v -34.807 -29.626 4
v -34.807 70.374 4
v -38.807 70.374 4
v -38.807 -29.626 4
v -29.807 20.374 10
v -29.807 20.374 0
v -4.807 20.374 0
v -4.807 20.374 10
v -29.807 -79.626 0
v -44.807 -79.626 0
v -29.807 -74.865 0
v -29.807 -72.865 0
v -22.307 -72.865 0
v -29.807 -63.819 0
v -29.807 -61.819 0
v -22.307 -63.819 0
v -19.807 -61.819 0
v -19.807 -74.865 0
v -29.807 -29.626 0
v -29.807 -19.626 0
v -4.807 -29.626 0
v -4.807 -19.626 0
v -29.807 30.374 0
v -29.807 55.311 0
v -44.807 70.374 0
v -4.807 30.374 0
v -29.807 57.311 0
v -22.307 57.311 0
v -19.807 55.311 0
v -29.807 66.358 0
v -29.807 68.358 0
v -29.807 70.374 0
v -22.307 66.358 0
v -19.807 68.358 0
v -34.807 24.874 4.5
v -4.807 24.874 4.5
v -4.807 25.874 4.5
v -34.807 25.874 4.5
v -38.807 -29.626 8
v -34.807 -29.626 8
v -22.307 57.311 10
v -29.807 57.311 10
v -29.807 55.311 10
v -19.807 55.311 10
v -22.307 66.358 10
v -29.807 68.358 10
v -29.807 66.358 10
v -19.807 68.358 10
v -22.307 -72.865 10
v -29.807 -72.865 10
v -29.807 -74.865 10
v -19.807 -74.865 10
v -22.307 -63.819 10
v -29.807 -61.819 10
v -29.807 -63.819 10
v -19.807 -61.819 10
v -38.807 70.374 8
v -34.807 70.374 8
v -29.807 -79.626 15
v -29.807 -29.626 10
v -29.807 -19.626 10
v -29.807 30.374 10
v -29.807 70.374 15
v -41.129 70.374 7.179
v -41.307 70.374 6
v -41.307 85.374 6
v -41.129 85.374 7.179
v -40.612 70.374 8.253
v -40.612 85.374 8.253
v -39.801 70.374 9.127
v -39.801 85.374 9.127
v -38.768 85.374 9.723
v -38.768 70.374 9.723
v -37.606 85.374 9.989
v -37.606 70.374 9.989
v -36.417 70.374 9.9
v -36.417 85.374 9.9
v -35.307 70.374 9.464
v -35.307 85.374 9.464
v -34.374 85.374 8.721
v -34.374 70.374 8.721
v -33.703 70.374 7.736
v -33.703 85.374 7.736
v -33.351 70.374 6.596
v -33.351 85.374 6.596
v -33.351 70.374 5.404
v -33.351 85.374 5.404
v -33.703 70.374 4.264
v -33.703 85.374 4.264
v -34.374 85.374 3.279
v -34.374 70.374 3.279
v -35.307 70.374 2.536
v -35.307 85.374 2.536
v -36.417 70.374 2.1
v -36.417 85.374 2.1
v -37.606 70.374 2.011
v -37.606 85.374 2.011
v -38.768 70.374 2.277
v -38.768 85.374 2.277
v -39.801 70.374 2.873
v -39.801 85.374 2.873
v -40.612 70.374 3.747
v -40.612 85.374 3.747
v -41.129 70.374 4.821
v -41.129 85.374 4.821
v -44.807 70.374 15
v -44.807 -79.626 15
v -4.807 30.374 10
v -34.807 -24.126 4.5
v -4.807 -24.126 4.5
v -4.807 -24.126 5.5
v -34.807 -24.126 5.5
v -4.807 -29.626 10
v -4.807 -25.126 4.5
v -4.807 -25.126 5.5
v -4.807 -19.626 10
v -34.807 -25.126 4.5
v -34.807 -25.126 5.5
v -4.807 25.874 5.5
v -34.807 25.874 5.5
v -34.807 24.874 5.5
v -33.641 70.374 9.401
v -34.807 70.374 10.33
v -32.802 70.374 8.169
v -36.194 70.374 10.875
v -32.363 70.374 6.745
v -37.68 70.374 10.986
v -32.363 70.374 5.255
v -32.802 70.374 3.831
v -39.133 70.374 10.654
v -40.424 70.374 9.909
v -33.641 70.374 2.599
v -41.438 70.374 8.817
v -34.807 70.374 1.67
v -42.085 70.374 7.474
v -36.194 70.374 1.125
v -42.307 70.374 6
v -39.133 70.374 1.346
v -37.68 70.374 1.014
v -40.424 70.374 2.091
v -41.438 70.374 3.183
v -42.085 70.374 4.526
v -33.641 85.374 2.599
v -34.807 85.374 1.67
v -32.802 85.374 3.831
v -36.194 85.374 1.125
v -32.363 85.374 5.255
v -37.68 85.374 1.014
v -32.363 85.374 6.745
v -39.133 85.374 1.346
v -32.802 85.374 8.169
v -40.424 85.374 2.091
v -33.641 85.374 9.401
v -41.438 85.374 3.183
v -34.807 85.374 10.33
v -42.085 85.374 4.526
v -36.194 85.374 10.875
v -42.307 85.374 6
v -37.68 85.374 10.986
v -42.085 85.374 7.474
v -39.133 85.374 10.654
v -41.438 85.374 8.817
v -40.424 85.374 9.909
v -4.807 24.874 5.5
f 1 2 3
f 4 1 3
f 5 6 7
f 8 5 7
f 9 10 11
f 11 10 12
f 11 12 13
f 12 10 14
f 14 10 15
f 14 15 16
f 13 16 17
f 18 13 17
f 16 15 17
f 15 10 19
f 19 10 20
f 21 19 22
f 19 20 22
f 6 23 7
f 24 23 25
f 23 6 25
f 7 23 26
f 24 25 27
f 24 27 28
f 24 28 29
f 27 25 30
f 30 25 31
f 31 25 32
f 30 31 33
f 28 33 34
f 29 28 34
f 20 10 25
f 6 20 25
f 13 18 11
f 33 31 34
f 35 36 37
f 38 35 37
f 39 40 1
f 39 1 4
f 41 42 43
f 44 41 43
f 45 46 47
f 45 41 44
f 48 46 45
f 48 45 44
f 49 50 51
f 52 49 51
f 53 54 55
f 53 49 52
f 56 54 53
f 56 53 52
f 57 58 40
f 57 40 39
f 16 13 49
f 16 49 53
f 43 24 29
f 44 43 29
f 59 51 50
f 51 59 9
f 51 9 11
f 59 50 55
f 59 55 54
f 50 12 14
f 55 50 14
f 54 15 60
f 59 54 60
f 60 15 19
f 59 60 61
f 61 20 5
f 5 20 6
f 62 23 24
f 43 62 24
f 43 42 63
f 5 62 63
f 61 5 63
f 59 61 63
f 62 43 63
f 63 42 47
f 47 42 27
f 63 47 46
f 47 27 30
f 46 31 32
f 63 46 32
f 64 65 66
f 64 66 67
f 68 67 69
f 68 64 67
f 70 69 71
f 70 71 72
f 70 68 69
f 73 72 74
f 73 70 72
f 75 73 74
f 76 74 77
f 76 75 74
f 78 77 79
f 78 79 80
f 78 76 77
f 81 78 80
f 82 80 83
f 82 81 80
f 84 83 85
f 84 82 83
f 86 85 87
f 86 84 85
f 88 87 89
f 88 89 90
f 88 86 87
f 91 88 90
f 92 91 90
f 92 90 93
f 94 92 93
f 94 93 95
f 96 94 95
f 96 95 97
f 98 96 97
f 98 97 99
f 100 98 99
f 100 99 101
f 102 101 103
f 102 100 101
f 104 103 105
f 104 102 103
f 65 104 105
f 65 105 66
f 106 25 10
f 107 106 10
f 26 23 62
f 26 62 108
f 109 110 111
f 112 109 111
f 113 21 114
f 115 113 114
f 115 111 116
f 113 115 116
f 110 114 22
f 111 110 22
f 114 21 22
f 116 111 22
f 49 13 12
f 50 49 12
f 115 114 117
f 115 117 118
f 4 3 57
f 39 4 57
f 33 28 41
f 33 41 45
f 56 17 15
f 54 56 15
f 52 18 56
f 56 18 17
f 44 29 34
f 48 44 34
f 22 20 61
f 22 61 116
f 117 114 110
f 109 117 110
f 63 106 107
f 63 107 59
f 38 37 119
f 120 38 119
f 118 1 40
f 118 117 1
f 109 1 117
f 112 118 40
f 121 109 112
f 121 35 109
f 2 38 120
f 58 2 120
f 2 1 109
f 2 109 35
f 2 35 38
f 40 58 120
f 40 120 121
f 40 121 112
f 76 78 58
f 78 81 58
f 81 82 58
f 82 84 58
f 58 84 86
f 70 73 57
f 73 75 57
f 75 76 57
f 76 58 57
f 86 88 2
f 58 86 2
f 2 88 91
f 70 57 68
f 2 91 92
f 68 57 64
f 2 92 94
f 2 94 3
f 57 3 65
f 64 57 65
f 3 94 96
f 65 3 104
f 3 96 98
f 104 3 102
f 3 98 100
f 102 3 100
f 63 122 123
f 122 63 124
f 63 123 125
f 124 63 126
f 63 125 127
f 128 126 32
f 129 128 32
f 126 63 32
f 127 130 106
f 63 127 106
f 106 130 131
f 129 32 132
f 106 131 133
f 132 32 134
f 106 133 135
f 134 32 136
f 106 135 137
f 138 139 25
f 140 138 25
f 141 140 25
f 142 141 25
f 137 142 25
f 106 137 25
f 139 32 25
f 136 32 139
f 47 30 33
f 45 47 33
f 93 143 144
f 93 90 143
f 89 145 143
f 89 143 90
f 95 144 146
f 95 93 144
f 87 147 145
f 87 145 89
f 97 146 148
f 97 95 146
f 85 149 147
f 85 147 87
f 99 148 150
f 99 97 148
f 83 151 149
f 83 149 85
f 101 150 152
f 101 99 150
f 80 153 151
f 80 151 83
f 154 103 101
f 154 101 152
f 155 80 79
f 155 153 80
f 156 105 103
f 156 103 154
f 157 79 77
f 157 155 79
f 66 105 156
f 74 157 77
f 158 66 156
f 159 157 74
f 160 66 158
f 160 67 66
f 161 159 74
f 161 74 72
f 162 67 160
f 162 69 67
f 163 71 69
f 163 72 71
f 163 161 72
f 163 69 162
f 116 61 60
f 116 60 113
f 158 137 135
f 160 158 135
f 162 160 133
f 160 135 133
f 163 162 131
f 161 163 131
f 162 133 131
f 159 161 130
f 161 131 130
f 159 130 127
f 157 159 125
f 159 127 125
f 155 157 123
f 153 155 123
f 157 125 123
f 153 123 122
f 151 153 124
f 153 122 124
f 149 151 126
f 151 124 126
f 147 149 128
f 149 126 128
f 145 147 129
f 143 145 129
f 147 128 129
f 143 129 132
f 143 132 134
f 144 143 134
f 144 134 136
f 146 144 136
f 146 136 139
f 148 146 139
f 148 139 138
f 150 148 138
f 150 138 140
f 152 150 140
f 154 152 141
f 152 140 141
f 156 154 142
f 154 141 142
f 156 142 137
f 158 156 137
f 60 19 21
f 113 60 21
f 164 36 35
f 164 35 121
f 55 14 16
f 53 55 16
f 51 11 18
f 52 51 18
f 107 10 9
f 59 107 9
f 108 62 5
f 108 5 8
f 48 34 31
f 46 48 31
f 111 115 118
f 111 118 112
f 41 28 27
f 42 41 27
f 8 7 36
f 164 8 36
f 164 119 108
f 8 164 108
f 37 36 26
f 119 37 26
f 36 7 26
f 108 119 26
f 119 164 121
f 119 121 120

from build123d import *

# Parameters (mm, degrees)
F1_DEPTH = 15
F0_W     = 25
F0_H     = 10
F0_W_2   = 2.5
F0_H_2   = 9.0467076302
F2_DEPTH = 10
F3_W     = 4
F3_H     = 4
F4_DEPTH = 100
F6_W     = 1
F6_H     = 1
F5_W     = 1
F5_H     = 1
F7_DEPTH = 30
F8_R     = 5
F8_R_2   = 4
F9_DEPTH = 15


with BuildPart() as f1:
    # F0 (on Top) → F1 (new body)
    with BuildSketch(Plane.XY):
        Polygon((-29.806669808, 70.373563841), (-44.806669808, 70.373563841), (-44.806669808, -79.626436159), (-29.806669808, -79.626436159), (-29.806669808, -74.8653486371), (-29.806669808, -72.8653486371), (-29.806669808, -63.8186410069), (-29.806669808, -61.8186410069), (-29.806669808, -29.626436159), (-29.806669808, -19.626436159), (-29.806669808, 20.373563841), (-29.806669808, 30.373563841), (-29.806669808, 55.3112663329), (-29.806669808, 57.3112663329), (-29.806669808, 66.357973963), (-29.806669808, 68.357973963), align=None)
    extrude(amount=F1_DEPTH)

    # F0 (on Top) → F2 (join)
    with BuildSketch(Plane.XY):
        with Locations((-17.306669808, 25.373563841)):
            Rectangle(F0_W, F0_H)
        with Locations((-17.306669808, -24.626436159)):
            Rectangle(F0_W, F0_H)
        Polygon((-29.806669808, -61.8186410069), (-29.806669808, -63.8186410069), (-22.306669808, -63.8186410069), (-19.806669808, -63.8186410069), (-19.806669808, -61.8186410069), align=None)
        with Locations((-21.056669808, -68.341994822)):
            Rectangle(F0_W_2, F0_H_2)
        Polygon((-29.806669808, -72.8653486371), (-29.806669808, -74.8653486371), (-19.806669808, -74.8653486371), (-19.806669808, -72.8653486371), (-22.306669808, -72.8653486371), align=None)
        Polygon((-22.3066698015, 57.3112663329), (-29.8066698015, 57.3112663329), (-29.806669808, 55.3112663329), (-19.8066698015, 55.3112663329), (-19.8066698015, 57.3112663329), align=None)
        with Locations((-21.0566698015, 61.8346201479)):
            Rectangle(F0_W_2, F0_H_2)
        Polygon((-19.8066698015, 68.357973963), (-29.8066698015, 68.357973963), (-29.806669808, 66.357973963), (-22.3066698015, 66.357973963), (-19.8066698015, 66.357973963), align=None)
    extrude(amount=F2_DEPTH)

    # F3 (on face) → F4 (cut)
    with BuildSketch(Plane(origin=(0, 70.373563841, 0), x_dir=(-1, 0, 0), z_dir=(0, 1, 0))):
        with Locations((36.806669808, 6)):
            Rectangle(F3_W, F3_H)
    extrude(amount=-F4_DEPTH, mode=Mode.SUBTRACT)

    # F6 (on face) + F5 (on face) → F7 (cut)
    with BuildSketch(Plane.YZ.offset(-4.806669808)):
        with Locations((25.373563841, 5)):
            Rectangle(F6_W, F6_H)
    with BuildSketch(Plane.YZ.offset(-4.806669808)):
        with Locations((-24.626436159, 5)):
            Rectangle(F5_W, F5_H)
    extrude(amount=-F7_DEPTH, mode=Mode.SUBTRACT)

    # F8 (on face) → F9 (join)
    with BuildSketch(Plane(origin=(0, 70.373563841, 0), x_dir=(-1, 0, 0), z_dir=(0, 1, 0))):
        with Locations((37.306669808, 6)):
            Circle(F8_R)
        with Locations((37.306669808, 6)):
            Circle(F8_R_2, mode=Mode.SUBTRACT)
    extrude(amount=F9_DEPTH)


solid = f1.part
